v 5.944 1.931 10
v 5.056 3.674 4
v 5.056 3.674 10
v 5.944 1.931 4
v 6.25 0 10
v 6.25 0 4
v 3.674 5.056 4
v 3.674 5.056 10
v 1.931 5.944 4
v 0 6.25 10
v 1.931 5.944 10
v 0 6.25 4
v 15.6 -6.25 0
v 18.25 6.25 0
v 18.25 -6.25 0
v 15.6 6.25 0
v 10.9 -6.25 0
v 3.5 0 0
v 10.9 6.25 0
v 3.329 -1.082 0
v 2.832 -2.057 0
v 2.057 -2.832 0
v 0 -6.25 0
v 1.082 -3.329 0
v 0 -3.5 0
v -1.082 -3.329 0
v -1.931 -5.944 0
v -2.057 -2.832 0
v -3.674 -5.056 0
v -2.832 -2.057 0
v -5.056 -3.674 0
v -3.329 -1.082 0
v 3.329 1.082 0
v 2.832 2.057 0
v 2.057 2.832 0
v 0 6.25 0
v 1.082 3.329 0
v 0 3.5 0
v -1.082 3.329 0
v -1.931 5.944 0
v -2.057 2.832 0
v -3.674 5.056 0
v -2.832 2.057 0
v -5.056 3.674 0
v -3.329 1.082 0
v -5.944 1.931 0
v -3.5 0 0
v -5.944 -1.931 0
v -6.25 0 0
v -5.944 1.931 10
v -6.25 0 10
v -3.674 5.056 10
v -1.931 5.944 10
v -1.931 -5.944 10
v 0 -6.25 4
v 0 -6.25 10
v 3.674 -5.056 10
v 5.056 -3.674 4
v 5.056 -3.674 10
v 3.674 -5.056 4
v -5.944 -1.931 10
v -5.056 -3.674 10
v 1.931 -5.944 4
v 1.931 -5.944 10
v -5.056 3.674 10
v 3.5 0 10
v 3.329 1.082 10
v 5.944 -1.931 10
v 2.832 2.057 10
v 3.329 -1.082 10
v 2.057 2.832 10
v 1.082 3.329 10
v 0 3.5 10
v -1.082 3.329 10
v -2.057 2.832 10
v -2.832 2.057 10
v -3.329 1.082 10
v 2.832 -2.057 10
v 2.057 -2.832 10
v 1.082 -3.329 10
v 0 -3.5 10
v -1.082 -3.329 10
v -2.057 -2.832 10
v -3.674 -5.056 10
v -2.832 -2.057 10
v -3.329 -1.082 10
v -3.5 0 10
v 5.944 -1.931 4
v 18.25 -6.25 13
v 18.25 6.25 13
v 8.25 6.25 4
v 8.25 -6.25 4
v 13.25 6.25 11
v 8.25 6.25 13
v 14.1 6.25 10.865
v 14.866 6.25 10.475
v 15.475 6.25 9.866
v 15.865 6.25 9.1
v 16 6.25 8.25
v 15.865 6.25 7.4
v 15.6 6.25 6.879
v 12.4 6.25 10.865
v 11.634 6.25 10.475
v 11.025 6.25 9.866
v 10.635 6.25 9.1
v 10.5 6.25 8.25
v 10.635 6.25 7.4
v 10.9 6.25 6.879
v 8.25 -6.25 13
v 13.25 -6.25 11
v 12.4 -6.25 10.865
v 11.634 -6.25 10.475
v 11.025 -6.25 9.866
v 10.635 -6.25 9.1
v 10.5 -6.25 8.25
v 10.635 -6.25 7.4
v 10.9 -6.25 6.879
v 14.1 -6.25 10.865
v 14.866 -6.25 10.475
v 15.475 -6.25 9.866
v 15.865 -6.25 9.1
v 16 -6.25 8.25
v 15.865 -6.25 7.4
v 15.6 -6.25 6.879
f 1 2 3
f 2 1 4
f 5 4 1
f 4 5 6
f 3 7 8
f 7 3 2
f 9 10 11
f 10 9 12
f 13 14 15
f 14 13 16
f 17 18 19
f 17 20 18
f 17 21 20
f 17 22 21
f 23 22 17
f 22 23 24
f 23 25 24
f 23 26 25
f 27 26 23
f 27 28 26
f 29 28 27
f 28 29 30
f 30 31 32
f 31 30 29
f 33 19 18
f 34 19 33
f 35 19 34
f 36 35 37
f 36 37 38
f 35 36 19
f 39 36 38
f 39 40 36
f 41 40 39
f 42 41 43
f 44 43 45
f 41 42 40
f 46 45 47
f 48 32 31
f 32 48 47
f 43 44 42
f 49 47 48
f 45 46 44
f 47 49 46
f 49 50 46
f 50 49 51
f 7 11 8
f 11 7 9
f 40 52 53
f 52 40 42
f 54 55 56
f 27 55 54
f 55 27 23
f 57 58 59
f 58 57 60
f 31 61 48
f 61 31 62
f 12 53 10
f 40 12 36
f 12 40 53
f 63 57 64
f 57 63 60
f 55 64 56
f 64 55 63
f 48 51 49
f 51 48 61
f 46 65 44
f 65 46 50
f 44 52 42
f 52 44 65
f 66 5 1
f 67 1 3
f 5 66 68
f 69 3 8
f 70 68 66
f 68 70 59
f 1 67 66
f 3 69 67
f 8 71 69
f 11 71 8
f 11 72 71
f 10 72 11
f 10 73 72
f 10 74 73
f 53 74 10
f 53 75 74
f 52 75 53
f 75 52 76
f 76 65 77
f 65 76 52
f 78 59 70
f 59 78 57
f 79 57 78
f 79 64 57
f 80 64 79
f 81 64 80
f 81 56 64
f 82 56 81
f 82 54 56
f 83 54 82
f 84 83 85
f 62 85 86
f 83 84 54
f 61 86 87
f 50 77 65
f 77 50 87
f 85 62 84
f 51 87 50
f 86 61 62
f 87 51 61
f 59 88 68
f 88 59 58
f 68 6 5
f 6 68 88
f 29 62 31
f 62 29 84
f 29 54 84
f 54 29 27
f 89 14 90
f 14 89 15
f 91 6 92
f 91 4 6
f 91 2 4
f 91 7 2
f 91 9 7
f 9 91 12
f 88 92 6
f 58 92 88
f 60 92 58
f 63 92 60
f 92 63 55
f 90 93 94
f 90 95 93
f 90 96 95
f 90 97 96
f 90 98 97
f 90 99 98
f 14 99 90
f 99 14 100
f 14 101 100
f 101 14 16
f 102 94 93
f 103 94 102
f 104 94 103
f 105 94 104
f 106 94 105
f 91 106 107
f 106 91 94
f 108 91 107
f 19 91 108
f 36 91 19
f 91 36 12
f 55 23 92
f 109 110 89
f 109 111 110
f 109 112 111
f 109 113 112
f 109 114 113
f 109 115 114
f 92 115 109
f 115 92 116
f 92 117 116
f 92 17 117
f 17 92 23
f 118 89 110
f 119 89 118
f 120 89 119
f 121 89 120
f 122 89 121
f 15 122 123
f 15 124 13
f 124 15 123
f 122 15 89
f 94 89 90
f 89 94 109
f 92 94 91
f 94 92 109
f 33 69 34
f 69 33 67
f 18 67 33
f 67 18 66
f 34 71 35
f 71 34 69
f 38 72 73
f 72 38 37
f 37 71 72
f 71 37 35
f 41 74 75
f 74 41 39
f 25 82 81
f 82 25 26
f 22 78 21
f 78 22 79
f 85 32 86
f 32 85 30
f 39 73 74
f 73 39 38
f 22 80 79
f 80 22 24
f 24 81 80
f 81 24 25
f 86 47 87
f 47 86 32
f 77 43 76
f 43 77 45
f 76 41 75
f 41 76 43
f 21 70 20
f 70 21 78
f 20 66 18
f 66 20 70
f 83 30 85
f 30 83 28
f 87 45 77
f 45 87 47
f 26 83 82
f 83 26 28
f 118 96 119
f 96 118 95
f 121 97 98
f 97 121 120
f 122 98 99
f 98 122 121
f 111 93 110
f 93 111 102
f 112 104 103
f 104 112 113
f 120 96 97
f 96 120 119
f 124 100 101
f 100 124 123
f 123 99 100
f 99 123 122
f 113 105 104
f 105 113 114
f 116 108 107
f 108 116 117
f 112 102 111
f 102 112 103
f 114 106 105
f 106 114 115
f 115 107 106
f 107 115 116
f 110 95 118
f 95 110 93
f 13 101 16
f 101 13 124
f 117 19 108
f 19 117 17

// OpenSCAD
/*
 * Shower Caddy Anchor, v1.0
 *
 * by Alex Franke (CodeCreations), Jun 2012
 * http://www.theFrankes.com
 * 
 * Licenced under Creative Commons Attribution - Non-Commercial - Share Alike 3.0 
 * 
 * DESCRIPTION: This is a simple parametric shower caddy anchor that uses a suction
 *   cup from a nerf dart to keep the caddy stable. 
 * 
 * INSTRUCTIONS:  Choose some values in the "User-defined values" section, render,
 *   and print one or more of the shower caddy anchors. (For me, it required about 
 *   285mm of filament -- about 5 cents.) Pull the suction cup(s) off of a Nerf 
 *   suction dart (e.g. http://amzn.com/B00284C4FK -- or you can get them at places 
 *   like Walmart) and clean off any remaining glue. Attach dart head to shower caddy 
 *   anchor. 
 * 
 * v1.0, Jun 17, 2012: Initial Release.
 * 
 * TODO: 
 *   * nothing yet...  
 */

/////////////////////////////////////////////////////////////////////////////
// User-defined values... 
/////////////////////////////////////////////////////////////////////////////

diameter      = 12.5;  // Diameter of the nerf dart
holeDiameter  = 7;     // Diameter of the hole in the nerf dart
height        = 10;    // Height of the suction cup mount
thickness     = 4;     // Thickness of the base that connects the cup to the clip
clipThickness = 10;    // Overall width of the clip 
clipHeight    = 13;    // Overall height of the clip 
gap           = 2	;     // Distance between the clip and the suction cup mount 
wireDiameter  = 5.5;   // Diameter of the caddy wire
gutterWidth   = 4.7;   // Width of the gap used to snap the wire in place. 

$fn           = 20;    // Curve detail 


/////////////////////////////////////////////////////////////////////////////
// Calculated values... 
/////////////////////////////////////////////////////////////////////////////

length = clipThickness + gap + diameter/2; 
gutterHeight = clipHeight-wireDiameter/2 - 2; 


/////////////////////////////////////////////////////////////////////////////
// The code... 
/////////////////////////////////////////////////////////////////////////////

difference() {
	union() {
		// Suction cup mount 
		translate([0,0,height/2]) 
			cylinder( r=diameter/2, h=height, center=true );

		// Base connecting suction cup mount to clip 
		translate([length/2,0,thickness/2]) 
			cube( [length,diameter,thickness], center=true);  

		// Caddy clip 
		translate([length-clipThickness/2,0,clipHeight/2]) 
			cube( [clipThickness,diameter,clipHeight], center=true);  
	}

	// Suction cup mount hole 
	translate([0,0,height/2]) 
		cylinder( r=holeDiameter/2, h=height+1, center=true );

	// Caddy wire hole
	translate([length-clipThickness/2,0,clipHeight-wireDiameter/2 - 2]) 
		rotate([90,0,0]) 
			cylinder( r=wireDiameter/2, h=diameter+1, center=true );

	// Caddy wire gutter 
	translate([length-clipThickness/2,0,(gutterHeight-1)/2]) 
		cube( [gutterWidth, diameter+1, gutterHeight+1], center=true );
}
